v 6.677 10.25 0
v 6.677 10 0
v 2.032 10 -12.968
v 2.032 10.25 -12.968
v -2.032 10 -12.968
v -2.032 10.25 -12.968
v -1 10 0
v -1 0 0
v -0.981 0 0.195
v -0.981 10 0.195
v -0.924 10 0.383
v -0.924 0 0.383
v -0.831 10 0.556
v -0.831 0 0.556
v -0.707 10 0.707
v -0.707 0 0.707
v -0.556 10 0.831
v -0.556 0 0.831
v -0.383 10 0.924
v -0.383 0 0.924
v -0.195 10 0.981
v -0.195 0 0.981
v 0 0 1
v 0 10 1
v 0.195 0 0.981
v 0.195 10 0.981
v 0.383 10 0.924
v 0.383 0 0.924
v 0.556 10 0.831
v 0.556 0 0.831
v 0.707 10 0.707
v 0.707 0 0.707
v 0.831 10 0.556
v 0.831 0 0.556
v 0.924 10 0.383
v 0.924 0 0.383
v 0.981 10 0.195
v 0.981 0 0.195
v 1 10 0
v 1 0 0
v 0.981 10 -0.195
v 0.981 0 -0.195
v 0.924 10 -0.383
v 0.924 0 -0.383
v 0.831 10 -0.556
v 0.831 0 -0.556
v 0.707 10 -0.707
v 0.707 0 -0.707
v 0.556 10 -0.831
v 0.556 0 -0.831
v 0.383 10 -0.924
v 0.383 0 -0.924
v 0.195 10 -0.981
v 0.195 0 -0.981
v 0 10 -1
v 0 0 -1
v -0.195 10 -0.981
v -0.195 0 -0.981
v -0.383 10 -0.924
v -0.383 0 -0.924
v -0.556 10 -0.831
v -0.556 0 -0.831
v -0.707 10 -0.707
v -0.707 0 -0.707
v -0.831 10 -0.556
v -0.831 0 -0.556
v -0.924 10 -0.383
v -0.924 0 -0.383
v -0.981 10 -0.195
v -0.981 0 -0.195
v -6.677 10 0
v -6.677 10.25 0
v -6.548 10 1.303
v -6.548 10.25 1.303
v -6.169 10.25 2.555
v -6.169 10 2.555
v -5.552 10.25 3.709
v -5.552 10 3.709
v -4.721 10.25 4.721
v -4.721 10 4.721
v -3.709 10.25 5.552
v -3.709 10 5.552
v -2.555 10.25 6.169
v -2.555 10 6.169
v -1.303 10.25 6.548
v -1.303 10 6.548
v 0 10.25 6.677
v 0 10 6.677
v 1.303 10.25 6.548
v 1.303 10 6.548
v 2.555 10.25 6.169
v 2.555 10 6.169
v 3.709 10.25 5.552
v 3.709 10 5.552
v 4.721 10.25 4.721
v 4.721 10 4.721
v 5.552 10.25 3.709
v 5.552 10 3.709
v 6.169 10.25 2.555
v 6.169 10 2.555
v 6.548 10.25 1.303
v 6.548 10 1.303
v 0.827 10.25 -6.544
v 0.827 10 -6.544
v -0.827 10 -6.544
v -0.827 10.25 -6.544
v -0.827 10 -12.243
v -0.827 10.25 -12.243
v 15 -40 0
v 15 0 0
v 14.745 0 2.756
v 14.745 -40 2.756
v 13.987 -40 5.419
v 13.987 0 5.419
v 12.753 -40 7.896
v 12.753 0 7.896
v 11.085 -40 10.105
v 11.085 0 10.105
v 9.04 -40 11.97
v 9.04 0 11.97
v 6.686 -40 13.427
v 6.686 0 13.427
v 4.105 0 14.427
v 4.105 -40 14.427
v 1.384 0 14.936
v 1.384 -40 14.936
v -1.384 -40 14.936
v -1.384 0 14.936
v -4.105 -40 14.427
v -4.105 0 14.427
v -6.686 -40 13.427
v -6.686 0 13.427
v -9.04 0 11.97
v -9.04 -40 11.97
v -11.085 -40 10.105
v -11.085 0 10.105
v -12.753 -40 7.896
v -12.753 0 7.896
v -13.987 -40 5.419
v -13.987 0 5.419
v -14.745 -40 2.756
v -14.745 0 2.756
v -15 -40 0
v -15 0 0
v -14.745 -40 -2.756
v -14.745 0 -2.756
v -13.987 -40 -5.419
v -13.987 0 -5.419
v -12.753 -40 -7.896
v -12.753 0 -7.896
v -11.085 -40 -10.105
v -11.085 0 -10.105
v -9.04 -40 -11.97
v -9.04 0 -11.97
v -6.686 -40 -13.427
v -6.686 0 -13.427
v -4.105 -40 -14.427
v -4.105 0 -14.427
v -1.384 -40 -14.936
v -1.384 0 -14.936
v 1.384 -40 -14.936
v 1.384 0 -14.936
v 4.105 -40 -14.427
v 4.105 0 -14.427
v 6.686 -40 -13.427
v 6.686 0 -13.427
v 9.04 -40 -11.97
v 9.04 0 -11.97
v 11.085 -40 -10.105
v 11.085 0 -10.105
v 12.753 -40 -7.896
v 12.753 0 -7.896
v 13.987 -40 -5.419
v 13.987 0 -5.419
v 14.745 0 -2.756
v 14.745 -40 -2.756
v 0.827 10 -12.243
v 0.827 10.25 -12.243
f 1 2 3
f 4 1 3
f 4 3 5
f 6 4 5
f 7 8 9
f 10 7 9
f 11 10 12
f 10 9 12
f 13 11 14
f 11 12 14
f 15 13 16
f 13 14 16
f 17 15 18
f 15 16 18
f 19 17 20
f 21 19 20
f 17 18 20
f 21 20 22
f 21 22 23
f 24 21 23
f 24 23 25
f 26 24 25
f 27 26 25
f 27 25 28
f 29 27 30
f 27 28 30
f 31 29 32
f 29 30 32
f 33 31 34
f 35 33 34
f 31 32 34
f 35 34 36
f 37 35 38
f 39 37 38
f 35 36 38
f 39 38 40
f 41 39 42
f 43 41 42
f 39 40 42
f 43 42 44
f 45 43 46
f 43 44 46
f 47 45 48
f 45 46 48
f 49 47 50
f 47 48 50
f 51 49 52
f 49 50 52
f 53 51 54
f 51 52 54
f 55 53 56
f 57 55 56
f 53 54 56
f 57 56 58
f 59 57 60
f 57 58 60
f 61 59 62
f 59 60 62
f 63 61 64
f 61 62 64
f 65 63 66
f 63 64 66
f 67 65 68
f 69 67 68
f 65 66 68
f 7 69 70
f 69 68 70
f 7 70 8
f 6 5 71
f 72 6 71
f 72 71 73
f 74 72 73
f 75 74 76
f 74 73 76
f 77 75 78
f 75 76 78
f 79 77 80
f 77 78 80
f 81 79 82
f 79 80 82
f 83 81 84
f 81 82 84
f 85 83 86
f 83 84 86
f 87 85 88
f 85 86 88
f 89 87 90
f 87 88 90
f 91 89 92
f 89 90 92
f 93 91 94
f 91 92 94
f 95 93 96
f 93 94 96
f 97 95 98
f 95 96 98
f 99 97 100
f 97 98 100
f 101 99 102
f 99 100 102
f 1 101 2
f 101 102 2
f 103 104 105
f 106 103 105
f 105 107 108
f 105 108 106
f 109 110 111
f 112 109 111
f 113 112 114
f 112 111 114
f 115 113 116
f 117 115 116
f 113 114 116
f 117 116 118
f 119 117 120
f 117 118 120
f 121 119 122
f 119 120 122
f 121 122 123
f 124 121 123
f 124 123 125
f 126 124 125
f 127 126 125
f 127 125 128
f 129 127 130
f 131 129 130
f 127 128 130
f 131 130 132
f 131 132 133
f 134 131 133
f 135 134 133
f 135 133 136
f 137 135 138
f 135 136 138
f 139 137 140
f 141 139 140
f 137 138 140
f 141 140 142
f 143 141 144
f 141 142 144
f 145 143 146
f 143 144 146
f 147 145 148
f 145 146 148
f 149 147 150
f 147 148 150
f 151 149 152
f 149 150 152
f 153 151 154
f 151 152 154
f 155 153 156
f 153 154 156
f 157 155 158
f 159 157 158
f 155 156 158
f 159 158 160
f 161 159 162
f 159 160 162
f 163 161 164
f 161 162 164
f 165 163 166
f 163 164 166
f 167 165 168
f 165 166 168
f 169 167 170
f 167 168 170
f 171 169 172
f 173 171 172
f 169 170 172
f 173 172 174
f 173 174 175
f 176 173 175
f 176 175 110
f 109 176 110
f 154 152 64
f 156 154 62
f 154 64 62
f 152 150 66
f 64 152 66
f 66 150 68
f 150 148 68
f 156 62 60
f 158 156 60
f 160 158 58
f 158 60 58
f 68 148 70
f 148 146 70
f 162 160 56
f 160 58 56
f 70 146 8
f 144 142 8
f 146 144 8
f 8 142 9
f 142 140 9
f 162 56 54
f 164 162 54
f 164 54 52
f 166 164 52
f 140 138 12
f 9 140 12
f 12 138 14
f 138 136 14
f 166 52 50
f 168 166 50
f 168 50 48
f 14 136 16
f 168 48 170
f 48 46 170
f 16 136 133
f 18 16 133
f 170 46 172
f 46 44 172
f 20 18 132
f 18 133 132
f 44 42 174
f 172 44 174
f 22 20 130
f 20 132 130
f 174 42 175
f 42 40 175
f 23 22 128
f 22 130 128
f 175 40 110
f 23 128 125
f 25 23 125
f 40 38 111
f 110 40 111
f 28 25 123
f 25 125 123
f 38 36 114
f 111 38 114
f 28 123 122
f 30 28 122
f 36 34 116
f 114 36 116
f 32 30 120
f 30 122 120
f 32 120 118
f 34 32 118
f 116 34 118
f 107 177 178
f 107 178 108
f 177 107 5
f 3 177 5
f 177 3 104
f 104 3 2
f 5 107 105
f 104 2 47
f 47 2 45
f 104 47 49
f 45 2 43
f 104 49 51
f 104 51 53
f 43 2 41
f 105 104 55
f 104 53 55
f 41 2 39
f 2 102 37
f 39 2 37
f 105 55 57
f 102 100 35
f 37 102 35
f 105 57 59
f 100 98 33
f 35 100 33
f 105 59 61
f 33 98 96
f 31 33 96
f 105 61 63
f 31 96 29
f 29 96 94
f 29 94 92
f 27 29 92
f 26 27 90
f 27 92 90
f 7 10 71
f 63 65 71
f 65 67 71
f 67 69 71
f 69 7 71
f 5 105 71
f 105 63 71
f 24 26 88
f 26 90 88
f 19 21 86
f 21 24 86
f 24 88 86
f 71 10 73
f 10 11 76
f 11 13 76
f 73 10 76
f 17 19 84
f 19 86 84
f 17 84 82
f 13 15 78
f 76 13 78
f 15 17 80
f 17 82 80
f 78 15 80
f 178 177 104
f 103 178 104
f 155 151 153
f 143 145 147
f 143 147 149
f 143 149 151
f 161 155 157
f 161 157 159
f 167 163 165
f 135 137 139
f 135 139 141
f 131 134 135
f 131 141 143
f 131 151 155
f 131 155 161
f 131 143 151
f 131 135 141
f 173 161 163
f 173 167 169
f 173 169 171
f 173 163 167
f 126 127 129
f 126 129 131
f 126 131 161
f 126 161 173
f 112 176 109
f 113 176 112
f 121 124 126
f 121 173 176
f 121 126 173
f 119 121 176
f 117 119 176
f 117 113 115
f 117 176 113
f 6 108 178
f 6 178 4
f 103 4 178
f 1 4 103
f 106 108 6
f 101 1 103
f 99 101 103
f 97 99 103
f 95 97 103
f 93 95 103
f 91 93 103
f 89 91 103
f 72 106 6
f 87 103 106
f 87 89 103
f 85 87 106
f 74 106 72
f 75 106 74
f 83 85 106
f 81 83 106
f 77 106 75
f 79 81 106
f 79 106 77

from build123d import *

# Parameters (mm, degrees)
F0_R     = 15
F1_DEPTH = 40
F2_R     = 1
F3_DEPTH = 10
F7_W     = 1.6538074706
F7_H     = 5.6983865798
F8_DEPTH = 0.25


# Not quite as in the source:
# - the program builds the solid bodies; features that only make, move or delete a surface that nothing else refers to are left out


with BuildPart() as f1:
    # F0 (on Front) → F1 (new body)
    with BuildSketch(Plane.XZ):
        Circle(F0_R)
    extrude(amount=F1_DEPTH)

    # F2 (on face) → F3 (join)
    with BuildSketch(Plane(origin=(0, 0, 0), x_dir=(-1, 0, 0), z_dir=(0, 1, 0))):
        Circle(F2_R)
    extrude(amount=F3_DEPTH)

    # F7 (on face) → F8 (join)
    with BuildSketch(Plane(origin=(0, 10, 0), x_dir=(-1, 0, 0), z_dir=(0, 1, 0))):
        with BuildLine():
            Line((2.032, -12.968), (6.6767431337, 0))
            ThreePointArc((6.6767431337, 0), (0, 6.6767431337), (-6.6767431337, 0))
            Line((-6.6767431337, 0), (-2.032, -12.968))
            Line((-2.032, -12.968), (2.032, -12.968))
        make_face()
        with Locations((0, -9.3933474272)):
            Rectangle(F7_W, F7_H, mode=Mode.SUBTRACT)
    extrude(amount=F8_DEPTH)


solid = f1.part
